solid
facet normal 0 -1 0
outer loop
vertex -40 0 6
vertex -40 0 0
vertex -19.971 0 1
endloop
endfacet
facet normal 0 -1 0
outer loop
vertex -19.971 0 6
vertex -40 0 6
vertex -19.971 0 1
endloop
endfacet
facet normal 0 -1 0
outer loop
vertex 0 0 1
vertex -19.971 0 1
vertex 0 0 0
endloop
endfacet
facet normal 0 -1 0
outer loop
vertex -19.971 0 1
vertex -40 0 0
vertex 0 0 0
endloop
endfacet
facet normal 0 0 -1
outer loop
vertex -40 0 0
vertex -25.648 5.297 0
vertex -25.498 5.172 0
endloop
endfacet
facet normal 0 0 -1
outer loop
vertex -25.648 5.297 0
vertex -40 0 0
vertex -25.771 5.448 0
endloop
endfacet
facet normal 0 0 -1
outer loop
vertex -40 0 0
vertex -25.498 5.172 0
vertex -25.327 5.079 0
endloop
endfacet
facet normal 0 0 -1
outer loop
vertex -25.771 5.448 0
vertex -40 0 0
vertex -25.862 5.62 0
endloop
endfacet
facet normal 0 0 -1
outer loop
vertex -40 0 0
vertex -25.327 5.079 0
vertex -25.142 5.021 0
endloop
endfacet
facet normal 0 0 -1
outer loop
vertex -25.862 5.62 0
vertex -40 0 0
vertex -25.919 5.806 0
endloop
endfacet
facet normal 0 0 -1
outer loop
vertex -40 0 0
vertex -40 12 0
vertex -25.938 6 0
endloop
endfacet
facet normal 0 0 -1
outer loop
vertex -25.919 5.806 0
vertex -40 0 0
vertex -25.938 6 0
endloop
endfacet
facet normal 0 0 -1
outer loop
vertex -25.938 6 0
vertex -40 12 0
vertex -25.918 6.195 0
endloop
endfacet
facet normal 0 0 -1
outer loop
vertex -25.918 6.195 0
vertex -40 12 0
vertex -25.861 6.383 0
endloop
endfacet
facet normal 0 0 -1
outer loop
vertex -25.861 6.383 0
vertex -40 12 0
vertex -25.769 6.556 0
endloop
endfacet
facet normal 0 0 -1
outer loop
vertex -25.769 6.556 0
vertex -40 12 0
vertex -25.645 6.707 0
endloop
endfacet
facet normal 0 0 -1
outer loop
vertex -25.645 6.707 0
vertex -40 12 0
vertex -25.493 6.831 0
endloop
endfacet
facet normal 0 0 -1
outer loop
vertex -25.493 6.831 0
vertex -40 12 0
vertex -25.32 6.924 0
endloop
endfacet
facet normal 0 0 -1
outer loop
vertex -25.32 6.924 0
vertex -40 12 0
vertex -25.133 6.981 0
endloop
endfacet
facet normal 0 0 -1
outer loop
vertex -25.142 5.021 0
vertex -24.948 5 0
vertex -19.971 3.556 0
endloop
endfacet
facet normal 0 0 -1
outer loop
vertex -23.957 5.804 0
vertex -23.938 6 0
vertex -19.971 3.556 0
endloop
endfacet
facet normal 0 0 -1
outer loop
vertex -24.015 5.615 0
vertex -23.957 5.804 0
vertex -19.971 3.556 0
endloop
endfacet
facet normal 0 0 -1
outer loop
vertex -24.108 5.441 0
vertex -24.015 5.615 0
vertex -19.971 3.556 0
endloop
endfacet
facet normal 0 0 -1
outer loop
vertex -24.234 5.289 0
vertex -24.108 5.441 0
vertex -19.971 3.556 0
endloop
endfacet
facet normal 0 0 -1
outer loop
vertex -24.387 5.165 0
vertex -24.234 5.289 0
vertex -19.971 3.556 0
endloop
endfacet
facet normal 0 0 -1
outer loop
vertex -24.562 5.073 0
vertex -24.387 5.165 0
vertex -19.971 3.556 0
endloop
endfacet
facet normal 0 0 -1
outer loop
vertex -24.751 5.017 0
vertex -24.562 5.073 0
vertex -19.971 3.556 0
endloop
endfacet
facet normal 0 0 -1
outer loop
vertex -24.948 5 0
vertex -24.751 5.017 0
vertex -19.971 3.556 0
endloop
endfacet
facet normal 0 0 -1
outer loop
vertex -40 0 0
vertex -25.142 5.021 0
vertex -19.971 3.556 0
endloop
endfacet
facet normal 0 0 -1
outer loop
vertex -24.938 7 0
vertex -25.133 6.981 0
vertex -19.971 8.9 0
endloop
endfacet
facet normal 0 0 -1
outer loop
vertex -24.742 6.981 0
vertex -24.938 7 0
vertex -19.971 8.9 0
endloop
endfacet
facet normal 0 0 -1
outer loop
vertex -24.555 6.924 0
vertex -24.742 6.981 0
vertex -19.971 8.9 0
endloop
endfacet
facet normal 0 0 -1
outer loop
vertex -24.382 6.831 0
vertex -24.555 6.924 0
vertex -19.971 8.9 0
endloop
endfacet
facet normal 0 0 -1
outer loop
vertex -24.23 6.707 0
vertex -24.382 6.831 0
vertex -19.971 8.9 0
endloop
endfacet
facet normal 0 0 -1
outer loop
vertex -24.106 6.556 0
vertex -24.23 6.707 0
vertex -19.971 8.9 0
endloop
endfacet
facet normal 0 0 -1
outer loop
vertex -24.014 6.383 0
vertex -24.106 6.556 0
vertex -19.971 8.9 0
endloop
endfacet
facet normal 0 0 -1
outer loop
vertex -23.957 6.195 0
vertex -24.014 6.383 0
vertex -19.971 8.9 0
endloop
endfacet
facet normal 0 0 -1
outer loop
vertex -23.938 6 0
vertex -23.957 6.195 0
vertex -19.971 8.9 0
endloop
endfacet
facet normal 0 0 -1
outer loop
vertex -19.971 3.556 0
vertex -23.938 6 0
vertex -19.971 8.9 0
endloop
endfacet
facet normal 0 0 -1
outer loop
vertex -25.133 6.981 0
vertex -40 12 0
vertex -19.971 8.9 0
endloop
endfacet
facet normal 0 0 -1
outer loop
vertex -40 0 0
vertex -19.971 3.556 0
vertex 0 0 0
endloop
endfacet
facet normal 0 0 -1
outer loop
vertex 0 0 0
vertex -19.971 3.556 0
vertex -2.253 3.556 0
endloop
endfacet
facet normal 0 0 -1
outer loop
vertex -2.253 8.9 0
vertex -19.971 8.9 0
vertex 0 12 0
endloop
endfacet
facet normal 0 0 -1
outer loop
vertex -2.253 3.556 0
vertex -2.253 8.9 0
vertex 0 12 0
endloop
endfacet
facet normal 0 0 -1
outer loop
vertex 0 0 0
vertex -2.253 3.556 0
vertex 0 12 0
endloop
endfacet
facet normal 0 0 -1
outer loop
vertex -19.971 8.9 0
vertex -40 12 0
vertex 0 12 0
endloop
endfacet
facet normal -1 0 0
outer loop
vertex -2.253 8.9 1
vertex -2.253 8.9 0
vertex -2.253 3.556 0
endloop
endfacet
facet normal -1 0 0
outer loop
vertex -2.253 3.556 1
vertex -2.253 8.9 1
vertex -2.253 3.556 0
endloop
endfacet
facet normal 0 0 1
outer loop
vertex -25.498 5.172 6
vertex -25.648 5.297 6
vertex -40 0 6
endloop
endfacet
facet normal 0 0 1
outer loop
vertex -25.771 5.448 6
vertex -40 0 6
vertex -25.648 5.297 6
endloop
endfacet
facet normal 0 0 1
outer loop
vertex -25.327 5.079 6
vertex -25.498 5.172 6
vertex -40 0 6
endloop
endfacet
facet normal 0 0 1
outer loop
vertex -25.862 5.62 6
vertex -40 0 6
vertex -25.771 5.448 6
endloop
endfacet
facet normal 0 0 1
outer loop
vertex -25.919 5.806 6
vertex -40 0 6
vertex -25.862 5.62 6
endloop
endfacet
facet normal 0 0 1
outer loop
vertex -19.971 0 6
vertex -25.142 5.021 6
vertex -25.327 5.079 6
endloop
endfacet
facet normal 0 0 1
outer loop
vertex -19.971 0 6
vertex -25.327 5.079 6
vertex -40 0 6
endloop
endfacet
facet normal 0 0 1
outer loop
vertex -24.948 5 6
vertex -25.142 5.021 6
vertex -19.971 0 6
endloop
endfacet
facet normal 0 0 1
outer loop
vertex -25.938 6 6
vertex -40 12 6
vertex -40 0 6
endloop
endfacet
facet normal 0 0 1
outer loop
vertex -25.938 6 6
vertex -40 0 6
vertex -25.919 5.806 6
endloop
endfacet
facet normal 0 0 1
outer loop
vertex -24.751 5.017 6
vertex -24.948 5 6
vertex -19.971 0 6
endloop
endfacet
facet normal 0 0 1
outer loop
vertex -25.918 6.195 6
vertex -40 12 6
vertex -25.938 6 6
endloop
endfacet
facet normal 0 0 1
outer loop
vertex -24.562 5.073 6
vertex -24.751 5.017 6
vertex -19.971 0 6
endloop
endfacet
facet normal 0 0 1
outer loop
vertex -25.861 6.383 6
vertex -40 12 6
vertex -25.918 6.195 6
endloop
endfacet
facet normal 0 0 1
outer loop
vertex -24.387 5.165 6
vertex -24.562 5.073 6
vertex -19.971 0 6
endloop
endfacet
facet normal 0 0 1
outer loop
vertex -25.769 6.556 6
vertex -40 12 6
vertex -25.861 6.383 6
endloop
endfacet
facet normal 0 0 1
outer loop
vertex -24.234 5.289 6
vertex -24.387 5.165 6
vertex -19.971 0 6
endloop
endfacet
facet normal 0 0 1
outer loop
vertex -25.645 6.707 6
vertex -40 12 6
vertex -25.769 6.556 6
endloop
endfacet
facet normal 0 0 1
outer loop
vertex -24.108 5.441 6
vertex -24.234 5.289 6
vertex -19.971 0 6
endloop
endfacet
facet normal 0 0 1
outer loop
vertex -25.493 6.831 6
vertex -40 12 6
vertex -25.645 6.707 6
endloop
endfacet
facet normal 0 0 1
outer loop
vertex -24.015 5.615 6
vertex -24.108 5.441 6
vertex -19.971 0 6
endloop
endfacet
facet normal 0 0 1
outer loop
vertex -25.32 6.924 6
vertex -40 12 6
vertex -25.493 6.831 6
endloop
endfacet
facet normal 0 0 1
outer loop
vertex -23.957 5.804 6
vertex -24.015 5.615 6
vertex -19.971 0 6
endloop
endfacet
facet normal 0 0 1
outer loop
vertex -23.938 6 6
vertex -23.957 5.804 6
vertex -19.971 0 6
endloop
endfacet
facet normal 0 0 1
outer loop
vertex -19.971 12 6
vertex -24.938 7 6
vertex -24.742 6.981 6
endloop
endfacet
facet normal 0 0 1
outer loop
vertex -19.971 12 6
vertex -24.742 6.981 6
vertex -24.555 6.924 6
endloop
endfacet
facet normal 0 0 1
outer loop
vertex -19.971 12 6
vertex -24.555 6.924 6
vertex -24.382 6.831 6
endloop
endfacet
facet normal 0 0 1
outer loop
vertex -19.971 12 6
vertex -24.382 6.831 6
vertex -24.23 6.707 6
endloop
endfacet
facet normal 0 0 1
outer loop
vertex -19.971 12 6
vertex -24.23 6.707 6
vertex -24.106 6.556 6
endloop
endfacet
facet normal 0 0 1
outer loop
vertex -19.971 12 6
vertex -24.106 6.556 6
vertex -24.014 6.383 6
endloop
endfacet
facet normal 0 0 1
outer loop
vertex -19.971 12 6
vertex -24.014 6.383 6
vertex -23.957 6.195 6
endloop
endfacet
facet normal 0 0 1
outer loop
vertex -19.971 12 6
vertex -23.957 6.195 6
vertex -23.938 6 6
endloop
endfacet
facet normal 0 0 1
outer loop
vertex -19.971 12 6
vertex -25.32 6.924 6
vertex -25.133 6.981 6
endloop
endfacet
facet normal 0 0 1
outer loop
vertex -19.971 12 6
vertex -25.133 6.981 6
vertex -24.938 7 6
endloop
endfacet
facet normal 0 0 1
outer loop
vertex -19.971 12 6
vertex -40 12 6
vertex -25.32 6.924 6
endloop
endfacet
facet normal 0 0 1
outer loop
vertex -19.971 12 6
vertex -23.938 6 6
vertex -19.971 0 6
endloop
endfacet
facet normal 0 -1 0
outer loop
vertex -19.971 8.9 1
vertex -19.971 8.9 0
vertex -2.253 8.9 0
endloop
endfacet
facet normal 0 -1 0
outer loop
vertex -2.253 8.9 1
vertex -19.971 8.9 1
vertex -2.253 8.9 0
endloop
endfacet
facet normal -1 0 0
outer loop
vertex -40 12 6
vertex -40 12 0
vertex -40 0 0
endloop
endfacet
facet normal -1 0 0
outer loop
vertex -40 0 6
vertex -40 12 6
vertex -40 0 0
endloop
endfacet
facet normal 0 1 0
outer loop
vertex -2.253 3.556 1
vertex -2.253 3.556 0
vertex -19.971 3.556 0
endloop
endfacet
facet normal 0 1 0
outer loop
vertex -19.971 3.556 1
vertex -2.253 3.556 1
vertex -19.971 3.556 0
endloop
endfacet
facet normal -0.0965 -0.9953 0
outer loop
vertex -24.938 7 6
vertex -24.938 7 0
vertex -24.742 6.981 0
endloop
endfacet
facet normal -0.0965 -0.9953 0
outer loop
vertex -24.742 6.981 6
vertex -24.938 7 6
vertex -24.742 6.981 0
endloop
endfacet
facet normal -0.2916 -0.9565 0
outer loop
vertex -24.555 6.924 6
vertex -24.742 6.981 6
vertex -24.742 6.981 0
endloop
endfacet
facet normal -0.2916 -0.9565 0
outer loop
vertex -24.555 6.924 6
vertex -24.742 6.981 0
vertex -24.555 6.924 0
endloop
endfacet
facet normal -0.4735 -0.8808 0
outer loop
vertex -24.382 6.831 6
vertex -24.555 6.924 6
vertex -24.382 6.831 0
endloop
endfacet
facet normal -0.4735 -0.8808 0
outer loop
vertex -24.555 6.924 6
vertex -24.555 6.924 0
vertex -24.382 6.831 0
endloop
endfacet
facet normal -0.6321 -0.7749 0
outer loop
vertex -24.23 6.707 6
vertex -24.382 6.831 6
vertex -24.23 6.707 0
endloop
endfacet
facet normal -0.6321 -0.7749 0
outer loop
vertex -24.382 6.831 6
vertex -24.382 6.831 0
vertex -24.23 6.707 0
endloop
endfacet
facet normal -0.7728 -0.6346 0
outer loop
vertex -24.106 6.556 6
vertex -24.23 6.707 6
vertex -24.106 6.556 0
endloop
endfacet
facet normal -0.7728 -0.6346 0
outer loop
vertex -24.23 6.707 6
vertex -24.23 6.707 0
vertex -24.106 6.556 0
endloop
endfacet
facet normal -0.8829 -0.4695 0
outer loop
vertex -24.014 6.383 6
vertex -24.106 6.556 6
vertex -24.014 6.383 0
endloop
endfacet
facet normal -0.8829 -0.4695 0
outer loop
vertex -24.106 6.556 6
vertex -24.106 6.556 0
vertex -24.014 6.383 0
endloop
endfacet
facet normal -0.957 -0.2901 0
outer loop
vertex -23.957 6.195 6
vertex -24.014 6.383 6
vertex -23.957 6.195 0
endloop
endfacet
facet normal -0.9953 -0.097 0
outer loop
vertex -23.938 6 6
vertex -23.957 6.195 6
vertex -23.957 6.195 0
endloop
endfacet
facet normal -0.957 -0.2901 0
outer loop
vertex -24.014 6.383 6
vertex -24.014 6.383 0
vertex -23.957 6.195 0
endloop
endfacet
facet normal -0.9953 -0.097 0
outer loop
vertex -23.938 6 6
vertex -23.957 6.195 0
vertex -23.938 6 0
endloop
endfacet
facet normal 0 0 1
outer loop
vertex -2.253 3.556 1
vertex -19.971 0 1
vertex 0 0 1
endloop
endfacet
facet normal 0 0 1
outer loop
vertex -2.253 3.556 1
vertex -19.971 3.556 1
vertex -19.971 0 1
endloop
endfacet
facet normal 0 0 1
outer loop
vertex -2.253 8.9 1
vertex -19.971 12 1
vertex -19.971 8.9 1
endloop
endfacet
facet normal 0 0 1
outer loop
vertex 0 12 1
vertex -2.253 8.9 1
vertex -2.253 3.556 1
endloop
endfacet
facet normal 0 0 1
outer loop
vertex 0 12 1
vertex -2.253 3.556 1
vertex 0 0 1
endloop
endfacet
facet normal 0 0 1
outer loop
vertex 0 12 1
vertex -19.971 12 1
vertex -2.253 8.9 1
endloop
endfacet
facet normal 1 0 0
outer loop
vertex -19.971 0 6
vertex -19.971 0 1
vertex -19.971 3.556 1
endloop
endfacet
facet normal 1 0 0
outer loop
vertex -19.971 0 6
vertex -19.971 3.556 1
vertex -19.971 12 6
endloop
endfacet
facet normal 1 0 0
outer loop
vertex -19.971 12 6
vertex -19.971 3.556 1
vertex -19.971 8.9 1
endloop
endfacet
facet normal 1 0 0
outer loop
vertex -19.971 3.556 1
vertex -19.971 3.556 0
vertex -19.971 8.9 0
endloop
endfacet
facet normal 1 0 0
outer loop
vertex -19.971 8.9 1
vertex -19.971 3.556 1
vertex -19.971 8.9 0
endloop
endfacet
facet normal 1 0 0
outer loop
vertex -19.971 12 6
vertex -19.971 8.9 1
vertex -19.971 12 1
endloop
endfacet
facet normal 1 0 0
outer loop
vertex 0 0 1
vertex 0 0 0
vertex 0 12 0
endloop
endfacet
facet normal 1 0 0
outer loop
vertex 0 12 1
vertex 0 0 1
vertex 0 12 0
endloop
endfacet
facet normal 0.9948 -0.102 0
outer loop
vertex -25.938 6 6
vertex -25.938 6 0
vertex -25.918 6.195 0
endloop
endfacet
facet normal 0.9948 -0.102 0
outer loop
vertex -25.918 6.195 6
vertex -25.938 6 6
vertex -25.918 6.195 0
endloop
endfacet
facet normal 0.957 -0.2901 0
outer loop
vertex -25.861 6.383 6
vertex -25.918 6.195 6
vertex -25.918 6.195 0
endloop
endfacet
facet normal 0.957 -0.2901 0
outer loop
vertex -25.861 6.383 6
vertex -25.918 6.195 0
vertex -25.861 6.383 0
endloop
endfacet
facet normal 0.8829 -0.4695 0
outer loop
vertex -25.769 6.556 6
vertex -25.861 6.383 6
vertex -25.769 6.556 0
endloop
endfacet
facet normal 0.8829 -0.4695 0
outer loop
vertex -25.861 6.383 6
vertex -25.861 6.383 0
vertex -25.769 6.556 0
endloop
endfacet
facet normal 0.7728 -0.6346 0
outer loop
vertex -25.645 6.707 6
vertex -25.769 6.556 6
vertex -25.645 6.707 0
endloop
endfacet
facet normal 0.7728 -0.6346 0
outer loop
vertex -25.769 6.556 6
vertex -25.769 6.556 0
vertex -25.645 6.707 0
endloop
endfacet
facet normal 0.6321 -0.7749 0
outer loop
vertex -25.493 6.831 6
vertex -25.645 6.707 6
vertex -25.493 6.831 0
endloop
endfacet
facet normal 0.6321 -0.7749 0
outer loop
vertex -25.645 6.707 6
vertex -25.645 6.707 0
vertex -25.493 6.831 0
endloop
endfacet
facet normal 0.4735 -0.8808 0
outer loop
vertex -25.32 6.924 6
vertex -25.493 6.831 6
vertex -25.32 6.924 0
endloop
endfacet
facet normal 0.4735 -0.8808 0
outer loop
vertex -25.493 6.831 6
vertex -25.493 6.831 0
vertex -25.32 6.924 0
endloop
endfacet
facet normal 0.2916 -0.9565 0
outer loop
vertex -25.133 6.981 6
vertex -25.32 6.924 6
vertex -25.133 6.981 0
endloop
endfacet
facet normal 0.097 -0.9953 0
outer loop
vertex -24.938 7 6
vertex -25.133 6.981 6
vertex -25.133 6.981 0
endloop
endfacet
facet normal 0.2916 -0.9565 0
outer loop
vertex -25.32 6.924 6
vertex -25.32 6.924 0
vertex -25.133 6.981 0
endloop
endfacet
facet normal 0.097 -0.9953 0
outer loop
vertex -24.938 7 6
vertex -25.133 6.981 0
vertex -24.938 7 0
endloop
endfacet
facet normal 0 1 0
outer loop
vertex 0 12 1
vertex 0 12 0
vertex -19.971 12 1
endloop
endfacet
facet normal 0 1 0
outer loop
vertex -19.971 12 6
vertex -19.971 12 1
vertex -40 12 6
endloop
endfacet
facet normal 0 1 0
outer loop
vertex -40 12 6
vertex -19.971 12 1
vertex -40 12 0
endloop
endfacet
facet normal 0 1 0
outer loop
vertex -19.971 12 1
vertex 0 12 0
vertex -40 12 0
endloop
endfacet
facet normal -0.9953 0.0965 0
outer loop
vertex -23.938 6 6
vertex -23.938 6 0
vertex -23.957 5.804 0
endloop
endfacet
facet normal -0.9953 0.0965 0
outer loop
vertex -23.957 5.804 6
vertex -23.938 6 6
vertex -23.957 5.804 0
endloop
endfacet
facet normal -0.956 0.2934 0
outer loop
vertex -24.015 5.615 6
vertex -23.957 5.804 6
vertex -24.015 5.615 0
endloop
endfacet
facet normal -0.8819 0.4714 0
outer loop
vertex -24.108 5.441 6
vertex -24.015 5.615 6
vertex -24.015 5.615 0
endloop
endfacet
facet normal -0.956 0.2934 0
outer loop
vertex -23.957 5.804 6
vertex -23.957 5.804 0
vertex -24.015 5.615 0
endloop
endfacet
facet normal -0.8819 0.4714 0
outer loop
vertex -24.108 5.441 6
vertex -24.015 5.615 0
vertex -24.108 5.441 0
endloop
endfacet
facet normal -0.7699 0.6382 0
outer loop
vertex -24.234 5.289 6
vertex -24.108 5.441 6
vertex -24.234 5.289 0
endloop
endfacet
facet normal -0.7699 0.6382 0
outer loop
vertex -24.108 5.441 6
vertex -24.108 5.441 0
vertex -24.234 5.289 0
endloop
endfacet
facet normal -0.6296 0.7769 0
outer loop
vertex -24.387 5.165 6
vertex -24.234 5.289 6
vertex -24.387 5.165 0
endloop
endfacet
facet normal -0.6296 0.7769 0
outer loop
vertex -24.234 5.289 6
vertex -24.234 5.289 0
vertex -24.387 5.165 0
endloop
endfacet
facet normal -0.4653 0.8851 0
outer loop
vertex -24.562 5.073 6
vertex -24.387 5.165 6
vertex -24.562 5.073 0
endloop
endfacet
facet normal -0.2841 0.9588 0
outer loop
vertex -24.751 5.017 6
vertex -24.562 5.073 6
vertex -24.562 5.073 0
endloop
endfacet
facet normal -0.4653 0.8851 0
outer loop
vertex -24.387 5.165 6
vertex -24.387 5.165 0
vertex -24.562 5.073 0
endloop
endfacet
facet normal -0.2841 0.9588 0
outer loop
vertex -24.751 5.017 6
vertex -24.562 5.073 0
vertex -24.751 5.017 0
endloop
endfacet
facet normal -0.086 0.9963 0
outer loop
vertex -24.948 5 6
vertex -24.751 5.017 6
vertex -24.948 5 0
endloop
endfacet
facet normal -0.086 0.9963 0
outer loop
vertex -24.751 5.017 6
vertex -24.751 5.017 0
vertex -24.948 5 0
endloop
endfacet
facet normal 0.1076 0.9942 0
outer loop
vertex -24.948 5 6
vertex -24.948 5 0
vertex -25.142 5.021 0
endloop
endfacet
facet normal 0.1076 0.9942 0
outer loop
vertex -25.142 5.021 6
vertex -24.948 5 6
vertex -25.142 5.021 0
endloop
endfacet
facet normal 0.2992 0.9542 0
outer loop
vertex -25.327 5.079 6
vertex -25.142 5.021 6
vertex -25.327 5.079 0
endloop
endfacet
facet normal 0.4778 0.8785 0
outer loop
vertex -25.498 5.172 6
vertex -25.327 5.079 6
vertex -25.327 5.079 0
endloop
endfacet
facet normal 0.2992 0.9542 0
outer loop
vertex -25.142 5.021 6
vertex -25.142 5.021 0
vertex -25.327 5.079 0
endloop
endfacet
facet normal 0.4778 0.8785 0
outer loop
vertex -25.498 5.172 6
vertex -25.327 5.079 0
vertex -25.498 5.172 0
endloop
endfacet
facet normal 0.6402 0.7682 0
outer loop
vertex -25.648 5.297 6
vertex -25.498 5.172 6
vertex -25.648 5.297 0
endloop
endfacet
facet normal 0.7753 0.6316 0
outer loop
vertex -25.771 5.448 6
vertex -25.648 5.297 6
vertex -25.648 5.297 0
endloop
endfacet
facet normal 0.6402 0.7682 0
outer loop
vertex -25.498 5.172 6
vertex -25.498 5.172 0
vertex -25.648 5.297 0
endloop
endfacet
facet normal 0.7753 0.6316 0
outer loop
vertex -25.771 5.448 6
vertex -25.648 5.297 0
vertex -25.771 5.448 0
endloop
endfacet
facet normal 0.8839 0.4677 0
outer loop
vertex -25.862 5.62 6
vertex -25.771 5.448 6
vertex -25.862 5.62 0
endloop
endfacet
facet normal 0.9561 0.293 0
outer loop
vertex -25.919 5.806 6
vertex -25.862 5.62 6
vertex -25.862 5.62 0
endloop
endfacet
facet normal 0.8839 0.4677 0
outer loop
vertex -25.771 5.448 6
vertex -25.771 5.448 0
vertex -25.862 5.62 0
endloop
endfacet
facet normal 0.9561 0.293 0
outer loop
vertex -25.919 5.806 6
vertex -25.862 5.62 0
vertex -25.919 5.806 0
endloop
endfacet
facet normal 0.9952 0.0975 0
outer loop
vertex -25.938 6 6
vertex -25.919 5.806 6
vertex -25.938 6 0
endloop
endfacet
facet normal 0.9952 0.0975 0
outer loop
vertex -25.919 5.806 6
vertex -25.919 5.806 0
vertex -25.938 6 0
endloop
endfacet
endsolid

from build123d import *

# Parameters (mm, degrees)
F1_DEPTH = 6
F2_DEPTH = 1


with BuildPart() as f1:
    # F0 (on Top) → F1 (new body)
    with BuildSketch(Plane.XY):
        Polygon((-25, 0), (-19.9713055044, 0), (-19.9713055044, 3.5559397656), (-24.9629596584, 3.5559397656), align=None)
        Polygon((-40, 0), (-25, 0), (-24.9629596584, 3.5559397656), (-40, 3.5559397656), align=None)
        with BuildLine():
            Line((-24.9629596584, 3.5559397656), (-19.9713055044, 3.5559397656))
            Line((-19.9713055044, 3.5559397656), (-19.9713055044, 6))
            Line((-19.9713055044, 6), (-23.9375011772, 6))
            ThreePointArc((-23.9375011772, 6), (-24.2340866143, 5.2892201799), (-24.9479170826, 5.000054247))
            Line((-24.9479170826, 5.000054247), (-24.9629596584, 3.5559397656))
        make_face()
        with BuildLine():
            Line((-19.9713055044, 8.8996905833), (-19.9713055044, 12))
            Line((-19.9713055044, 12), (-24.9375011772, 12))
            Line((-24.9375011772, 12), (-24.9375011772, 7))
            ThreePointArc((-24.9375011772, 7), (-24.230394396, 6.7071067812), (-23.9375011772, 6))
            Line((-23.9375011772, 6), (-19.9713055044, 6))
            Line((-19.9713055044, 6), (-19.9713055044, 8.8996905833))
        make_face()
        with BuildLine():
            Line((-40, 3.5559397656), (-24.9629596584, 3.5559397656))
            Line((-24.9629596584, 3.5559397656), (-24.9479170826, 5.000054247))
            ThreePointArc((-24.9479170826, 5.000054247), (-25.6482809973, 5.2965854371), (-25.9375011772, 6))
            Line((-25.9375011772, 6), (-40, 6))
            Line((-40, 6), (-40, 3.5559397656))
        make_face()
        with BuildLine():
            Line((-24.9375011772, 7), (-24.9375011772, 12))
            Line((-24.9375011772, 12), (-40, 12))
            Line((-40, 12), (-40, 6))
            Line((-40, 6), (-25.9375011772, 6))
            ThreePointArc((-25.9375011772, 6), (-25.6446079584, 6.7071067812), (-24.9375011772, 7))
        make_face()
    extrude(amount=F1_DEPTH)

    # F0 (on Top) → F2 (join)
    with BuildSketch(Plane.XY):
        Polygon((-19.9713055044, 0), (0, 0), (0, 12), (-19.9713055044, 12), (-19.9713055044, 8.8996905833), (-2.2525554523, 8.8996905833), (-2.2525554523, 3.5559397656), (-19.9713055044, 3.5559397656), align=None)
    extrude(amount=F2_DEPTH)


solid = f1.part
